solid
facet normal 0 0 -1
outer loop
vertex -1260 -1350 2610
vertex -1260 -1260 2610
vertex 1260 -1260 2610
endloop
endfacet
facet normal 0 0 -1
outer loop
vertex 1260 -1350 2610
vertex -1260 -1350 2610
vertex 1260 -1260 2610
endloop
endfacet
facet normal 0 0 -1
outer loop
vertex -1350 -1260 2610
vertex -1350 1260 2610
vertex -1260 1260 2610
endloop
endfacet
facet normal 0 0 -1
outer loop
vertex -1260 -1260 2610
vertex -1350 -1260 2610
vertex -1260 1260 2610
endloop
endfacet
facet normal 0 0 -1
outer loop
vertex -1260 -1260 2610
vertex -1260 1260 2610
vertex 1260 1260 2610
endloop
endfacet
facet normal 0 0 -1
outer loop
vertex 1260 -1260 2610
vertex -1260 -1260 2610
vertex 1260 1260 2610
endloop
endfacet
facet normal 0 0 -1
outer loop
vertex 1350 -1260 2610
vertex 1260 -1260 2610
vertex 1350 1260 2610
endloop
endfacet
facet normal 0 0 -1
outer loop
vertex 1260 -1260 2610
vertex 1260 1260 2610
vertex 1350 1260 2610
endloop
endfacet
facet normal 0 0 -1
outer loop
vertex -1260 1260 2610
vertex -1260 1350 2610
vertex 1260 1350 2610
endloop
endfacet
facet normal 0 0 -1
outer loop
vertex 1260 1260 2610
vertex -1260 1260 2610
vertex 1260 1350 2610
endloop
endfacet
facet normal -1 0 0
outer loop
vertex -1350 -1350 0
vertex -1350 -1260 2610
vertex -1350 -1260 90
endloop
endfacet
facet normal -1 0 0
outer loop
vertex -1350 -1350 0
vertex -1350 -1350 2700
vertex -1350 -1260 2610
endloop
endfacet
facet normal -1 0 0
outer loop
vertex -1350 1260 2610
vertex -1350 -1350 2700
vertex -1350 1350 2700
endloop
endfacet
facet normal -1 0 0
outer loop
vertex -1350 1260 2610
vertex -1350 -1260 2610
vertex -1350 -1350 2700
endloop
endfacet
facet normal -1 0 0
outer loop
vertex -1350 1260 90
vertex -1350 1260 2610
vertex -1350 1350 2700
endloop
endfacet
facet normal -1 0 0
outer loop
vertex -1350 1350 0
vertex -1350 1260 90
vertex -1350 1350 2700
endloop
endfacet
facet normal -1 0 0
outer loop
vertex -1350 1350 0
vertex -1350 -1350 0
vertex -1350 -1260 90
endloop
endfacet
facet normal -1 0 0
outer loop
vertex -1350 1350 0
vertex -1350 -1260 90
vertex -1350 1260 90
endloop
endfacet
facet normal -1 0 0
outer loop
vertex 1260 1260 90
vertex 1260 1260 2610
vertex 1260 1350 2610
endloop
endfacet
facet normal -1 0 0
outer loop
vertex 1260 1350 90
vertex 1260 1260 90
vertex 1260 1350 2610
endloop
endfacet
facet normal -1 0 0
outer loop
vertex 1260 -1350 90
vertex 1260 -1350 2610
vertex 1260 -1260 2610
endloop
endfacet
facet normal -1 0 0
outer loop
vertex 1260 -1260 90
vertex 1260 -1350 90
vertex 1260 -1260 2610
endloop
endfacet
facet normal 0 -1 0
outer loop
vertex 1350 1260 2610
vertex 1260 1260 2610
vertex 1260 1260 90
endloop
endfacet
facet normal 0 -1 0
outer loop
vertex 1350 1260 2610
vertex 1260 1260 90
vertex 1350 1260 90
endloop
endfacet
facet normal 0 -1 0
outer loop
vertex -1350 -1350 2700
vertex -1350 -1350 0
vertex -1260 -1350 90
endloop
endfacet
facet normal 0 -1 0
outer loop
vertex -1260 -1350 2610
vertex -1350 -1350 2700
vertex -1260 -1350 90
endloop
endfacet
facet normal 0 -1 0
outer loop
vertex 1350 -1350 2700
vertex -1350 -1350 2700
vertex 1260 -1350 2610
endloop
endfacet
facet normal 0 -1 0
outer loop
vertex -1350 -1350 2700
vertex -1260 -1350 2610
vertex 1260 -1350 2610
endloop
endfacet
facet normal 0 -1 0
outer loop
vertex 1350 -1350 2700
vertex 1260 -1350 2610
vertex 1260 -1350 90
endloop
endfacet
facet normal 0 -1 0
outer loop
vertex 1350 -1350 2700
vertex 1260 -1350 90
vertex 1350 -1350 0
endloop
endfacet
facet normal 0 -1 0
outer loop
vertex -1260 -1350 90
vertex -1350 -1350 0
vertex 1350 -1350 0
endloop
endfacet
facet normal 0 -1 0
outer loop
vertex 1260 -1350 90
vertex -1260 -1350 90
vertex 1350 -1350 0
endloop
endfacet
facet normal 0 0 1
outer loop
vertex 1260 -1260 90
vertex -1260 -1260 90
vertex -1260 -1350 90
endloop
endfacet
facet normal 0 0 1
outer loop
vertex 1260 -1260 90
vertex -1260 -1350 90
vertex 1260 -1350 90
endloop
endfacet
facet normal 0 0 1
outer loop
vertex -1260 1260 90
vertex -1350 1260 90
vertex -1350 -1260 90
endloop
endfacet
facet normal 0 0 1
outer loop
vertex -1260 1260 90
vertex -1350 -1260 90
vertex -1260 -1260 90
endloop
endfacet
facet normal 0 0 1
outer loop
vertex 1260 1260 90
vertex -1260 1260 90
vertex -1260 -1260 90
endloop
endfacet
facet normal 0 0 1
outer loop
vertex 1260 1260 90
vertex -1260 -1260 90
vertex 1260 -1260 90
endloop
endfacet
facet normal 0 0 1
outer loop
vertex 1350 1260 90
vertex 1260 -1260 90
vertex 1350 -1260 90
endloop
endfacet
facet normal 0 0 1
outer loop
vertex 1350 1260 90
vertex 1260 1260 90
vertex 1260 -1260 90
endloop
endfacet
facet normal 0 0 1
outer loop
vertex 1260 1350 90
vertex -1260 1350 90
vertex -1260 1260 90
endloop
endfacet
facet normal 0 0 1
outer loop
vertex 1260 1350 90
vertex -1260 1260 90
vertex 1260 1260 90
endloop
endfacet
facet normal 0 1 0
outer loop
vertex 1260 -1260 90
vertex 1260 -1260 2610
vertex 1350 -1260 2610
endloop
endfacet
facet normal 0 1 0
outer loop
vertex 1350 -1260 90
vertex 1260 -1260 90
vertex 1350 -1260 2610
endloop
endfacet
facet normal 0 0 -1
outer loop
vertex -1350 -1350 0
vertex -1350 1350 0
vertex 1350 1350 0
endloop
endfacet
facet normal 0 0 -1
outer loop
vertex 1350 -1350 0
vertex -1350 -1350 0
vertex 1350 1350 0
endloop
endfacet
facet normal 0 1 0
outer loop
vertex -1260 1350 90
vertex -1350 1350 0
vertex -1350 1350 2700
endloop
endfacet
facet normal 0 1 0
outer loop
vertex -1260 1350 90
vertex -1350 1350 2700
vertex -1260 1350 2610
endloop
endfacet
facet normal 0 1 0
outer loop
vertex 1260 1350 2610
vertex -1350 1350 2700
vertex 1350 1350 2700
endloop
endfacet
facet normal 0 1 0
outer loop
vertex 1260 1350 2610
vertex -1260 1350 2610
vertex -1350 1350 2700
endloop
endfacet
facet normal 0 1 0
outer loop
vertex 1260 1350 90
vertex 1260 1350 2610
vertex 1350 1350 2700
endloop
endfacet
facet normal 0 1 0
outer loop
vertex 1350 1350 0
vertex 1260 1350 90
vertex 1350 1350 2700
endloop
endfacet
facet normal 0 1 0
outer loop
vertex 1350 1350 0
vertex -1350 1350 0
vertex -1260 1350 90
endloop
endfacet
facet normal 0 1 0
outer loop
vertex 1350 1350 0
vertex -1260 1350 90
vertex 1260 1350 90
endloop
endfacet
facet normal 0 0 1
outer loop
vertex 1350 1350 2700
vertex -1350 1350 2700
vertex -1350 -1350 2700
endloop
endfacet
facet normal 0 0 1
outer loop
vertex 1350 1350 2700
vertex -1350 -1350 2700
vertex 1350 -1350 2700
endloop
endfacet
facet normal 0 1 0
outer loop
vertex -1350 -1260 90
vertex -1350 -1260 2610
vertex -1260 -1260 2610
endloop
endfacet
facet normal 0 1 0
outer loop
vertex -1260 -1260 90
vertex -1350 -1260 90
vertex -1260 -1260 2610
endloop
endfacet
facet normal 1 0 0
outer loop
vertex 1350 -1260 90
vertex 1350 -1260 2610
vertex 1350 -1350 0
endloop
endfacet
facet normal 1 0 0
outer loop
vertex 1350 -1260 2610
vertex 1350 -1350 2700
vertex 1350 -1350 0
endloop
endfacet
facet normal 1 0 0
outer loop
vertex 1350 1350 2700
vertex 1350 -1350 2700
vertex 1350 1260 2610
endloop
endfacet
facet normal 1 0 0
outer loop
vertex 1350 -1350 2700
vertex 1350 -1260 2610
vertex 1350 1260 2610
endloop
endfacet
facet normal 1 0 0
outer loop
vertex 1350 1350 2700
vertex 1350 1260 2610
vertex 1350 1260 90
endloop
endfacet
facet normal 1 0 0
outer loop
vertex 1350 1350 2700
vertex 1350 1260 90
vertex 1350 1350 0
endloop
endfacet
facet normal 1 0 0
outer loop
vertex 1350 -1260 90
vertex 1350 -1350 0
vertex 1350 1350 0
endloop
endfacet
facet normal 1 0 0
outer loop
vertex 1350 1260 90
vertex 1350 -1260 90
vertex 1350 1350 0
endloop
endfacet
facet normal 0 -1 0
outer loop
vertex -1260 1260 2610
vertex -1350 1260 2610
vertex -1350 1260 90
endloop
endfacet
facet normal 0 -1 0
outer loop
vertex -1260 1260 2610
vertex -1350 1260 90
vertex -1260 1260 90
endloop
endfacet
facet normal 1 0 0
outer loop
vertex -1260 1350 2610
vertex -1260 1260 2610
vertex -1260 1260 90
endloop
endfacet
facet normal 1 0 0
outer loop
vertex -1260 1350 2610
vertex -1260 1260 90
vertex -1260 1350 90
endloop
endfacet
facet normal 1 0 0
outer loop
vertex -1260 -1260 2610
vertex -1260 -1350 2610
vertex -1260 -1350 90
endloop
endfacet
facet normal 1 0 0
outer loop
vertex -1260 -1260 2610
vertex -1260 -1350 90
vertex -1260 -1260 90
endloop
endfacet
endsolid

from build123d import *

# Parameters (mm, degrees)
F0_W     = 2700
F0_H     = 2700
F1_DEPTH = 90
F2_W     = 90
F2_H     = 90
F3_DEPTH = 2610
F4_W     = 2700
F4_H     = 2700
F5_DEPTH = 90


with BuildPart() as f1:
    # F0 (on Top) → F1 (new body)
    with BuildSketch(Plane.XY):
        Rectangle(F0_W, F0_H)
    extrude(amount=F1_DEPTH)

    # F2 (on face) → F3 (join)
    with BuildSketch(Plane.XY.offset(90)):
        with Locations((-1305, -1305)):
            Rectangle(F2_W, F2_H)
        with Locations((1305, -1305)):
            Rectangle(F2_W, F2_H)
        with Locations((1305, 1305)):
            Rectangle(F2_W, F2_H)
        with Locations((-1305, 1305)):
            Rectangle(F2_W, F2_H)
    extrude(amount=F3_DEPTH)

    # F4 (on face) → F5 (join)
    with BuildSketch(Plane.XY.offset(2700)):
        Rectangle(F4_W, F4_H)
    extrude(amount=-F5_DEPTH)


solid = f1.part
